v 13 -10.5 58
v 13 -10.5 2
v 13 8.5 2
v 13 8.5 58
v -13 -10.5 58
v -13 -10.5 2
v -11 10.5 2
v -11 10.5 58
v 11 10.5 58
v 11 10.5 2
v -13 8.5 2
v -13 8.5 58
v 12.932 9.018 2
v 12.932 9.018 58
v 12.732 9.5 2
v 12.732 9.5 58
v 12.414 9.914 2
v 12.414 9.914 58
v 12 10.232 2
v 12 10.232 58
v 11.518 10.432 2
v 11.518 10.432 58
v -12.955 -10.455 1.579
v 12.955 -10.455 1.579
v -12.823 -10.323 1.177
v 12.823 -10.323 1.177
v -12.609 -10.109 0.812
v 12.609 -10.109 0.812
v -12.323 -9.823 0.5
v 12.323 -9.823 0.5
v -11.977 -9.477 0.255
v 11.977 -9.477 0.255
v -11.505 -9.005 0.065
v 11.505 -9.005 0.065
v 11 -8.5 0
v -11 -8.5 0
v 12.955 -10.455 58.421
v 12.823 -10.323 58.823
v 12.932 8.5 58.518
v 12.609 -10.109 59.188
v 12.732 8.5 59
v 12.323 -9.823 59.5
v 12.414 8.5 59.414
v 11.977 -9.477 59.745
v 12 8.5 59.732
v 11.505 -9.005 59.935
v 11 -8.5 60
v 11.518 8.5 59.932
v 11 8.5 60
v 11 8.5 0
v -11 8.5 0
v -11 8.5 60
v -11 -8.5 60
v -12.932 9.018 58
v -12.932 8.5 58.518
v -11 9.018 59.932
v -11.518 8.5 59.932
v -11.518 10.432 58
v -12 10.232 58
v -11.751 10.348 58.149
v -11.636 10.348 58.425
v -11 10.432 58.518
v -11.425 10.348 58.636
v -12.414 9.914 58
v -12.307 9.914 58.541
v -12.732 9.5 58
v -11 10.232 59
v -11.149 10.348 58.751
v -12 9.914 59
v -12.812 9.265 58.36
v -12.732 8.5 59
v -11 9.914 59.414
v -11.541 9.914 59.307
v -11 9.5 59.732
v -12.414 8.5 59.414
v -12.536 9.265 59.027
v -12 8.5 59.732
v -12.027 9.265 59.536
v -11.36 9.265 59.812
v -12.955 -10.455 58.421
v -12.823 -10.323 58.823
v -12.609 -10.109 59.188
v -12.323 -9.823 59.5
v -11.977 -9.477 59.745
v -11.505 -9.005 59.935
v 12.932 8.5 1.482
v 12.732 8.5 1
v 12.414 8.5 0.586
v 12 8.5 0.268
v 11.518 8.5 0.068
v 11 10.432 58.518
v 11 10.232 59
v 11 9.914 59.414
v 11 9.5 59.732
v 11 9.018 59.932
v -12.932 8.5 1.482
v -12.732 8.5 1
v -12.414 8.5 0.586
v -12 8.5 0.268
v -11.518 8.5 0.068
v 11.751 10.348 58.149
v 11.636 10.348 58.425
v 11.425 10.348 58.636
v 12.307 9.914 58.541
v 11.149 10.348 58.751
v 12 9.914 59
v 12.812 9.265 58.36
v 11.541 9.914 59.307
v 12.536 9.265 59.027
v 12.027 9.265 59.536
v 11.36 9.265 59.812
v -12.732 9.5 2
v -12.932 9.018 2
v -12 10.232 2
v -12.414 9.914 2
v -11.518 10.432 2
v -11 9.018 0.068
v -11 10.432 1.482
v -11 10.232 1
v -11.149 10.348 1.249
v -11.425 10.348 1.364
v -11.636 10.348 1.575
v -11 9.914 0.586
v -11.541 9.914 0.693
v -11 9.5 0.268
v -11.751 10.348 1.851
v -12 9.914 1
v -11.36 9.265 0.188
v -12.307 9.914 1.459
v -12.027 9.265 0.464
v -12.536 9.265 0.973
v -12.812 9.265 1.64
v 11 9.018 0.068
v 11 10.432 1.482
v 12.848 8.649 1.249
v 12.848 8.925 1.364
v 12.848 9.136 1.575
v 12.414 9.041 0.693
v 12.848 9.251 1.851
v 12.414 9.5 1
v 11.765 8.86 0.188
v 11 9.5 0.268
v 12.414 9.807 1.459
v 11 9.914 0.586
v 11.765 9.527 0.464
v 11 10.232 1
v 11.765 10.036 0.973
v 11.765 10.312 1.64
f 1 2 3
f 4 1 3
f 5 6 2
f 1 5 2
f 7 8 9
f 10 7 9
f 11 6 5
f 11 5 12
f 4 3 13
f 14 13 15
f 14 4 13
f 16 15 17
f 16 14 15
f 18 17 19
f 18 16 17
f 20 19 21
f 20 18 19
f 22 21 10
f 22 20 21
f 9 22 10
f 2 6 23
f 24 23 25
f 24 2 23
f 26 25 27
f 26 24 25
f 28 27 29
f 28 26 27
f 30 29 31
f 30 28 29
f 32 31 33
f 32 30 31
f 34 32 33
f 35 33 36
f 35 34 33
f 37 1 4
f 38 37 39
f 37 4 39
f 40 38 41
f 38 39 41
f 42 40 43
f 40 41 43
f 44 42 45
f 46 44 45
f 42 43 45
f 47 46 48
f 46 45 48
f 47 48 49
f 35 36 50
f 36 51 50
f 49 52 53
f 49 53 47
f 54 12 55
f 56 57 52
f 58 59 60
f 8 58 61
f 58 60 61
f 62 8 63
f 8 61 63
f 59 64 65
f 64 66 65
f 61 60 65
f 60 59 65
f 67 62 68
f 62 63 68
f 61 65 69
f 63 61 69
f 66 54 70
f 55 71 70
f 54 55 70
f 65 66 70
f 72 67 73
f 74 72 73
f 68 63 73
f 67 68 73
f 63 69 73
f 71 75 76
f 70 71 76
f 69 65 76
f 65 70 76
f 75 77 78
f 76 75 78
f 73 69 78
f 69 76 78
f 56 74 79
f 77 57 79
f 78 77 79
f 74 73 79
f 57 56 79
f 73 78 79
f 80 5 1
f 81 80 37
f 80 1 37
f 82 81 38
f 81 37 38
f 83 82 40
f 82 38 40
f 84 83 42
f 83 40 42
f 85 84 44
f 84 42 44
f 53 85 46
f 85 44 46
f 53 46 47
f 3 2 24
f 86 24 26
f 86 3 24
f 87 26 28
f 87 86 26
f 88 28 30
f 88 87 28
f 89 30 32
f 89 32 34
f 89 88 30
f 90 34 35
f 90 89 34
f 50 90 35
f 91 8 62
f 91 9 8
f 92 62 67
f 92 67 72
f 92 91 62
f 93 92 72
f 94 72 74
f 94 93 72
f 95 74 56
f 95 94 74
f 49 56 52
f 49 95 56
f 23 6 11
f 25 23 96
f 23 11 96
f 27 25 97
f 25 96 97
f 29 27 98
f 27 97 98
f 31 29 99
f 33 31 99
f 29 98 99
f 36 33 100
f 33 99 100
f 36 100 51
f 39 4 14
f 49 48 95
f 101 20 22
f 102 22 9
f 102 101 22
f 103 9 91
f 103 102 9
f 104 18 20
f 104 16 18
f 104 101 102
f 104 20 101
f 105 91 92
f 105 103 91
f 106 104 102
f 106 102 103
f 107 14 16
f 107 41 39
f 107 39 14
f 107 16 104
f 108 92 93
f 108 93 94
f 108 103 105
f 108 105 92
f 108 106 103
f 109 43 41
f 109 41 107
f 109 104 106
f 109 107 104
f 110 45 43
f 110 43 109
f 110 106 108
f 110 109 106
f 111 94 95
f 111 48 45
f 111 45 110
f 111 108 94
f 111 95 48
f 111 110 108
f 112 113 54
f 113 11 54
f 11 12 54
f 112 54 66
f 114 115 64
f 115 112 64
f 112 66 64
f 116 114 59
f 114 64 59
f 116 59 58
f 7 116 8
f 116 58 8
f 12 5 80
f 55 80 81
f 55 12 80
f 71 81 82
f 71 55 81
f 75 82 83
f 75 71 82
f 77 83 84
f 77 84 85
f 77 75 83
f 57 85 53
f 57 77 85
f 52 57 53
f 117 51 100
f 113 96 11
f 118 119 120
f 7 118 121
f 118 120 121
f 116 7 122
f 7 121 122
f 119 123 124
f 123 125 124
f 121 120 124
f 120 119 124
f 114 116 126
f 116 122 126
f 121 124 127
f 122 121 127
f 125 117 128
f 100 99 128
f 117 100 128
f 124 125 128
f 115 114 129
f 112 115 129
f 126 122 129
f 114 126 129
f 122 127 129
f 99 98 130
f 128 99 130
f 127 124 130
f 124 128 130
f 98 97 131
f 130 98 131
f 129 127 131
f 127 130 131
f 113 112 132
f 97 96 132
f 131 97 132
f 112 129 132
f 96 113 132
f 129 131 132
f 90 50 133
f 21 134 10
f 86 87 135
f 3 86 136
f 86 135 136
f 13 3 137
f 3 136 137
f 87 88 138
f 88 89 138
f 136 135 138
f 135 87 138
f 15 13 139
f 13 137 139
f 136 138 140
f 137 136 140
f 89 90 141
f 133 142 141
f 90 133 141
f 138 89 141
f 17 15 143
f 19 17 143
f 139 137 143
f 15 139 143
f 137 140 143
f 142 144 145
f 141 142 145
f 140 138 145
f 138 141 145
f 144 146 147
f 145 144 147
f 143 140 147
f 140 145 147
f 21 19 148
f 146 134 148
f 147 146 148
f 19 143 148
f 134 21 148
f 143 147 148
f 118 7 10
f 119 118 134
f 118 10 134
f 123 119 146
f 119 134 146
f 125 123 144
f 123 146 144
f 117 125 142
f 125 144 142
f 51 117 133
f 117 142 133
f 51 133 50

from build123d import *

# Parameters (mm, degrees)
SKETCH_1_W      = 26
SKETCH_1_H      = 21
EXTRUDE_1_DEPTH = 60
FILLET_1_R      = 2


with BuildPart() as part:
    # 草图1 → 凸台-拉伸1 (new body)
    with BuildSketch(Plane.XY):
        Rectangle(SKETCH_1_W, SKETCH_1_H)
    extrude(amount=EXTRUDE_1_DEPTH)

    # 圆角1
    fillet_1_edges = [part.edges().sort_by_distance(p)[0] for p in [
        (-13, 0, 60),
        (0, -10.5, 60),
        (13, 0, 60),
        (0, -10.5, 0),
        (-13, 0, 0),
        (0, 10.5, 0),
        (13, 0, 0),
        (-13, 10.5, 30),
        (13, 10.5, 30),
        (0, 10.5, 60),
    ]]
    fillet(fillet_1_edges, radius=FILLET_1_R)


solid = part.part
